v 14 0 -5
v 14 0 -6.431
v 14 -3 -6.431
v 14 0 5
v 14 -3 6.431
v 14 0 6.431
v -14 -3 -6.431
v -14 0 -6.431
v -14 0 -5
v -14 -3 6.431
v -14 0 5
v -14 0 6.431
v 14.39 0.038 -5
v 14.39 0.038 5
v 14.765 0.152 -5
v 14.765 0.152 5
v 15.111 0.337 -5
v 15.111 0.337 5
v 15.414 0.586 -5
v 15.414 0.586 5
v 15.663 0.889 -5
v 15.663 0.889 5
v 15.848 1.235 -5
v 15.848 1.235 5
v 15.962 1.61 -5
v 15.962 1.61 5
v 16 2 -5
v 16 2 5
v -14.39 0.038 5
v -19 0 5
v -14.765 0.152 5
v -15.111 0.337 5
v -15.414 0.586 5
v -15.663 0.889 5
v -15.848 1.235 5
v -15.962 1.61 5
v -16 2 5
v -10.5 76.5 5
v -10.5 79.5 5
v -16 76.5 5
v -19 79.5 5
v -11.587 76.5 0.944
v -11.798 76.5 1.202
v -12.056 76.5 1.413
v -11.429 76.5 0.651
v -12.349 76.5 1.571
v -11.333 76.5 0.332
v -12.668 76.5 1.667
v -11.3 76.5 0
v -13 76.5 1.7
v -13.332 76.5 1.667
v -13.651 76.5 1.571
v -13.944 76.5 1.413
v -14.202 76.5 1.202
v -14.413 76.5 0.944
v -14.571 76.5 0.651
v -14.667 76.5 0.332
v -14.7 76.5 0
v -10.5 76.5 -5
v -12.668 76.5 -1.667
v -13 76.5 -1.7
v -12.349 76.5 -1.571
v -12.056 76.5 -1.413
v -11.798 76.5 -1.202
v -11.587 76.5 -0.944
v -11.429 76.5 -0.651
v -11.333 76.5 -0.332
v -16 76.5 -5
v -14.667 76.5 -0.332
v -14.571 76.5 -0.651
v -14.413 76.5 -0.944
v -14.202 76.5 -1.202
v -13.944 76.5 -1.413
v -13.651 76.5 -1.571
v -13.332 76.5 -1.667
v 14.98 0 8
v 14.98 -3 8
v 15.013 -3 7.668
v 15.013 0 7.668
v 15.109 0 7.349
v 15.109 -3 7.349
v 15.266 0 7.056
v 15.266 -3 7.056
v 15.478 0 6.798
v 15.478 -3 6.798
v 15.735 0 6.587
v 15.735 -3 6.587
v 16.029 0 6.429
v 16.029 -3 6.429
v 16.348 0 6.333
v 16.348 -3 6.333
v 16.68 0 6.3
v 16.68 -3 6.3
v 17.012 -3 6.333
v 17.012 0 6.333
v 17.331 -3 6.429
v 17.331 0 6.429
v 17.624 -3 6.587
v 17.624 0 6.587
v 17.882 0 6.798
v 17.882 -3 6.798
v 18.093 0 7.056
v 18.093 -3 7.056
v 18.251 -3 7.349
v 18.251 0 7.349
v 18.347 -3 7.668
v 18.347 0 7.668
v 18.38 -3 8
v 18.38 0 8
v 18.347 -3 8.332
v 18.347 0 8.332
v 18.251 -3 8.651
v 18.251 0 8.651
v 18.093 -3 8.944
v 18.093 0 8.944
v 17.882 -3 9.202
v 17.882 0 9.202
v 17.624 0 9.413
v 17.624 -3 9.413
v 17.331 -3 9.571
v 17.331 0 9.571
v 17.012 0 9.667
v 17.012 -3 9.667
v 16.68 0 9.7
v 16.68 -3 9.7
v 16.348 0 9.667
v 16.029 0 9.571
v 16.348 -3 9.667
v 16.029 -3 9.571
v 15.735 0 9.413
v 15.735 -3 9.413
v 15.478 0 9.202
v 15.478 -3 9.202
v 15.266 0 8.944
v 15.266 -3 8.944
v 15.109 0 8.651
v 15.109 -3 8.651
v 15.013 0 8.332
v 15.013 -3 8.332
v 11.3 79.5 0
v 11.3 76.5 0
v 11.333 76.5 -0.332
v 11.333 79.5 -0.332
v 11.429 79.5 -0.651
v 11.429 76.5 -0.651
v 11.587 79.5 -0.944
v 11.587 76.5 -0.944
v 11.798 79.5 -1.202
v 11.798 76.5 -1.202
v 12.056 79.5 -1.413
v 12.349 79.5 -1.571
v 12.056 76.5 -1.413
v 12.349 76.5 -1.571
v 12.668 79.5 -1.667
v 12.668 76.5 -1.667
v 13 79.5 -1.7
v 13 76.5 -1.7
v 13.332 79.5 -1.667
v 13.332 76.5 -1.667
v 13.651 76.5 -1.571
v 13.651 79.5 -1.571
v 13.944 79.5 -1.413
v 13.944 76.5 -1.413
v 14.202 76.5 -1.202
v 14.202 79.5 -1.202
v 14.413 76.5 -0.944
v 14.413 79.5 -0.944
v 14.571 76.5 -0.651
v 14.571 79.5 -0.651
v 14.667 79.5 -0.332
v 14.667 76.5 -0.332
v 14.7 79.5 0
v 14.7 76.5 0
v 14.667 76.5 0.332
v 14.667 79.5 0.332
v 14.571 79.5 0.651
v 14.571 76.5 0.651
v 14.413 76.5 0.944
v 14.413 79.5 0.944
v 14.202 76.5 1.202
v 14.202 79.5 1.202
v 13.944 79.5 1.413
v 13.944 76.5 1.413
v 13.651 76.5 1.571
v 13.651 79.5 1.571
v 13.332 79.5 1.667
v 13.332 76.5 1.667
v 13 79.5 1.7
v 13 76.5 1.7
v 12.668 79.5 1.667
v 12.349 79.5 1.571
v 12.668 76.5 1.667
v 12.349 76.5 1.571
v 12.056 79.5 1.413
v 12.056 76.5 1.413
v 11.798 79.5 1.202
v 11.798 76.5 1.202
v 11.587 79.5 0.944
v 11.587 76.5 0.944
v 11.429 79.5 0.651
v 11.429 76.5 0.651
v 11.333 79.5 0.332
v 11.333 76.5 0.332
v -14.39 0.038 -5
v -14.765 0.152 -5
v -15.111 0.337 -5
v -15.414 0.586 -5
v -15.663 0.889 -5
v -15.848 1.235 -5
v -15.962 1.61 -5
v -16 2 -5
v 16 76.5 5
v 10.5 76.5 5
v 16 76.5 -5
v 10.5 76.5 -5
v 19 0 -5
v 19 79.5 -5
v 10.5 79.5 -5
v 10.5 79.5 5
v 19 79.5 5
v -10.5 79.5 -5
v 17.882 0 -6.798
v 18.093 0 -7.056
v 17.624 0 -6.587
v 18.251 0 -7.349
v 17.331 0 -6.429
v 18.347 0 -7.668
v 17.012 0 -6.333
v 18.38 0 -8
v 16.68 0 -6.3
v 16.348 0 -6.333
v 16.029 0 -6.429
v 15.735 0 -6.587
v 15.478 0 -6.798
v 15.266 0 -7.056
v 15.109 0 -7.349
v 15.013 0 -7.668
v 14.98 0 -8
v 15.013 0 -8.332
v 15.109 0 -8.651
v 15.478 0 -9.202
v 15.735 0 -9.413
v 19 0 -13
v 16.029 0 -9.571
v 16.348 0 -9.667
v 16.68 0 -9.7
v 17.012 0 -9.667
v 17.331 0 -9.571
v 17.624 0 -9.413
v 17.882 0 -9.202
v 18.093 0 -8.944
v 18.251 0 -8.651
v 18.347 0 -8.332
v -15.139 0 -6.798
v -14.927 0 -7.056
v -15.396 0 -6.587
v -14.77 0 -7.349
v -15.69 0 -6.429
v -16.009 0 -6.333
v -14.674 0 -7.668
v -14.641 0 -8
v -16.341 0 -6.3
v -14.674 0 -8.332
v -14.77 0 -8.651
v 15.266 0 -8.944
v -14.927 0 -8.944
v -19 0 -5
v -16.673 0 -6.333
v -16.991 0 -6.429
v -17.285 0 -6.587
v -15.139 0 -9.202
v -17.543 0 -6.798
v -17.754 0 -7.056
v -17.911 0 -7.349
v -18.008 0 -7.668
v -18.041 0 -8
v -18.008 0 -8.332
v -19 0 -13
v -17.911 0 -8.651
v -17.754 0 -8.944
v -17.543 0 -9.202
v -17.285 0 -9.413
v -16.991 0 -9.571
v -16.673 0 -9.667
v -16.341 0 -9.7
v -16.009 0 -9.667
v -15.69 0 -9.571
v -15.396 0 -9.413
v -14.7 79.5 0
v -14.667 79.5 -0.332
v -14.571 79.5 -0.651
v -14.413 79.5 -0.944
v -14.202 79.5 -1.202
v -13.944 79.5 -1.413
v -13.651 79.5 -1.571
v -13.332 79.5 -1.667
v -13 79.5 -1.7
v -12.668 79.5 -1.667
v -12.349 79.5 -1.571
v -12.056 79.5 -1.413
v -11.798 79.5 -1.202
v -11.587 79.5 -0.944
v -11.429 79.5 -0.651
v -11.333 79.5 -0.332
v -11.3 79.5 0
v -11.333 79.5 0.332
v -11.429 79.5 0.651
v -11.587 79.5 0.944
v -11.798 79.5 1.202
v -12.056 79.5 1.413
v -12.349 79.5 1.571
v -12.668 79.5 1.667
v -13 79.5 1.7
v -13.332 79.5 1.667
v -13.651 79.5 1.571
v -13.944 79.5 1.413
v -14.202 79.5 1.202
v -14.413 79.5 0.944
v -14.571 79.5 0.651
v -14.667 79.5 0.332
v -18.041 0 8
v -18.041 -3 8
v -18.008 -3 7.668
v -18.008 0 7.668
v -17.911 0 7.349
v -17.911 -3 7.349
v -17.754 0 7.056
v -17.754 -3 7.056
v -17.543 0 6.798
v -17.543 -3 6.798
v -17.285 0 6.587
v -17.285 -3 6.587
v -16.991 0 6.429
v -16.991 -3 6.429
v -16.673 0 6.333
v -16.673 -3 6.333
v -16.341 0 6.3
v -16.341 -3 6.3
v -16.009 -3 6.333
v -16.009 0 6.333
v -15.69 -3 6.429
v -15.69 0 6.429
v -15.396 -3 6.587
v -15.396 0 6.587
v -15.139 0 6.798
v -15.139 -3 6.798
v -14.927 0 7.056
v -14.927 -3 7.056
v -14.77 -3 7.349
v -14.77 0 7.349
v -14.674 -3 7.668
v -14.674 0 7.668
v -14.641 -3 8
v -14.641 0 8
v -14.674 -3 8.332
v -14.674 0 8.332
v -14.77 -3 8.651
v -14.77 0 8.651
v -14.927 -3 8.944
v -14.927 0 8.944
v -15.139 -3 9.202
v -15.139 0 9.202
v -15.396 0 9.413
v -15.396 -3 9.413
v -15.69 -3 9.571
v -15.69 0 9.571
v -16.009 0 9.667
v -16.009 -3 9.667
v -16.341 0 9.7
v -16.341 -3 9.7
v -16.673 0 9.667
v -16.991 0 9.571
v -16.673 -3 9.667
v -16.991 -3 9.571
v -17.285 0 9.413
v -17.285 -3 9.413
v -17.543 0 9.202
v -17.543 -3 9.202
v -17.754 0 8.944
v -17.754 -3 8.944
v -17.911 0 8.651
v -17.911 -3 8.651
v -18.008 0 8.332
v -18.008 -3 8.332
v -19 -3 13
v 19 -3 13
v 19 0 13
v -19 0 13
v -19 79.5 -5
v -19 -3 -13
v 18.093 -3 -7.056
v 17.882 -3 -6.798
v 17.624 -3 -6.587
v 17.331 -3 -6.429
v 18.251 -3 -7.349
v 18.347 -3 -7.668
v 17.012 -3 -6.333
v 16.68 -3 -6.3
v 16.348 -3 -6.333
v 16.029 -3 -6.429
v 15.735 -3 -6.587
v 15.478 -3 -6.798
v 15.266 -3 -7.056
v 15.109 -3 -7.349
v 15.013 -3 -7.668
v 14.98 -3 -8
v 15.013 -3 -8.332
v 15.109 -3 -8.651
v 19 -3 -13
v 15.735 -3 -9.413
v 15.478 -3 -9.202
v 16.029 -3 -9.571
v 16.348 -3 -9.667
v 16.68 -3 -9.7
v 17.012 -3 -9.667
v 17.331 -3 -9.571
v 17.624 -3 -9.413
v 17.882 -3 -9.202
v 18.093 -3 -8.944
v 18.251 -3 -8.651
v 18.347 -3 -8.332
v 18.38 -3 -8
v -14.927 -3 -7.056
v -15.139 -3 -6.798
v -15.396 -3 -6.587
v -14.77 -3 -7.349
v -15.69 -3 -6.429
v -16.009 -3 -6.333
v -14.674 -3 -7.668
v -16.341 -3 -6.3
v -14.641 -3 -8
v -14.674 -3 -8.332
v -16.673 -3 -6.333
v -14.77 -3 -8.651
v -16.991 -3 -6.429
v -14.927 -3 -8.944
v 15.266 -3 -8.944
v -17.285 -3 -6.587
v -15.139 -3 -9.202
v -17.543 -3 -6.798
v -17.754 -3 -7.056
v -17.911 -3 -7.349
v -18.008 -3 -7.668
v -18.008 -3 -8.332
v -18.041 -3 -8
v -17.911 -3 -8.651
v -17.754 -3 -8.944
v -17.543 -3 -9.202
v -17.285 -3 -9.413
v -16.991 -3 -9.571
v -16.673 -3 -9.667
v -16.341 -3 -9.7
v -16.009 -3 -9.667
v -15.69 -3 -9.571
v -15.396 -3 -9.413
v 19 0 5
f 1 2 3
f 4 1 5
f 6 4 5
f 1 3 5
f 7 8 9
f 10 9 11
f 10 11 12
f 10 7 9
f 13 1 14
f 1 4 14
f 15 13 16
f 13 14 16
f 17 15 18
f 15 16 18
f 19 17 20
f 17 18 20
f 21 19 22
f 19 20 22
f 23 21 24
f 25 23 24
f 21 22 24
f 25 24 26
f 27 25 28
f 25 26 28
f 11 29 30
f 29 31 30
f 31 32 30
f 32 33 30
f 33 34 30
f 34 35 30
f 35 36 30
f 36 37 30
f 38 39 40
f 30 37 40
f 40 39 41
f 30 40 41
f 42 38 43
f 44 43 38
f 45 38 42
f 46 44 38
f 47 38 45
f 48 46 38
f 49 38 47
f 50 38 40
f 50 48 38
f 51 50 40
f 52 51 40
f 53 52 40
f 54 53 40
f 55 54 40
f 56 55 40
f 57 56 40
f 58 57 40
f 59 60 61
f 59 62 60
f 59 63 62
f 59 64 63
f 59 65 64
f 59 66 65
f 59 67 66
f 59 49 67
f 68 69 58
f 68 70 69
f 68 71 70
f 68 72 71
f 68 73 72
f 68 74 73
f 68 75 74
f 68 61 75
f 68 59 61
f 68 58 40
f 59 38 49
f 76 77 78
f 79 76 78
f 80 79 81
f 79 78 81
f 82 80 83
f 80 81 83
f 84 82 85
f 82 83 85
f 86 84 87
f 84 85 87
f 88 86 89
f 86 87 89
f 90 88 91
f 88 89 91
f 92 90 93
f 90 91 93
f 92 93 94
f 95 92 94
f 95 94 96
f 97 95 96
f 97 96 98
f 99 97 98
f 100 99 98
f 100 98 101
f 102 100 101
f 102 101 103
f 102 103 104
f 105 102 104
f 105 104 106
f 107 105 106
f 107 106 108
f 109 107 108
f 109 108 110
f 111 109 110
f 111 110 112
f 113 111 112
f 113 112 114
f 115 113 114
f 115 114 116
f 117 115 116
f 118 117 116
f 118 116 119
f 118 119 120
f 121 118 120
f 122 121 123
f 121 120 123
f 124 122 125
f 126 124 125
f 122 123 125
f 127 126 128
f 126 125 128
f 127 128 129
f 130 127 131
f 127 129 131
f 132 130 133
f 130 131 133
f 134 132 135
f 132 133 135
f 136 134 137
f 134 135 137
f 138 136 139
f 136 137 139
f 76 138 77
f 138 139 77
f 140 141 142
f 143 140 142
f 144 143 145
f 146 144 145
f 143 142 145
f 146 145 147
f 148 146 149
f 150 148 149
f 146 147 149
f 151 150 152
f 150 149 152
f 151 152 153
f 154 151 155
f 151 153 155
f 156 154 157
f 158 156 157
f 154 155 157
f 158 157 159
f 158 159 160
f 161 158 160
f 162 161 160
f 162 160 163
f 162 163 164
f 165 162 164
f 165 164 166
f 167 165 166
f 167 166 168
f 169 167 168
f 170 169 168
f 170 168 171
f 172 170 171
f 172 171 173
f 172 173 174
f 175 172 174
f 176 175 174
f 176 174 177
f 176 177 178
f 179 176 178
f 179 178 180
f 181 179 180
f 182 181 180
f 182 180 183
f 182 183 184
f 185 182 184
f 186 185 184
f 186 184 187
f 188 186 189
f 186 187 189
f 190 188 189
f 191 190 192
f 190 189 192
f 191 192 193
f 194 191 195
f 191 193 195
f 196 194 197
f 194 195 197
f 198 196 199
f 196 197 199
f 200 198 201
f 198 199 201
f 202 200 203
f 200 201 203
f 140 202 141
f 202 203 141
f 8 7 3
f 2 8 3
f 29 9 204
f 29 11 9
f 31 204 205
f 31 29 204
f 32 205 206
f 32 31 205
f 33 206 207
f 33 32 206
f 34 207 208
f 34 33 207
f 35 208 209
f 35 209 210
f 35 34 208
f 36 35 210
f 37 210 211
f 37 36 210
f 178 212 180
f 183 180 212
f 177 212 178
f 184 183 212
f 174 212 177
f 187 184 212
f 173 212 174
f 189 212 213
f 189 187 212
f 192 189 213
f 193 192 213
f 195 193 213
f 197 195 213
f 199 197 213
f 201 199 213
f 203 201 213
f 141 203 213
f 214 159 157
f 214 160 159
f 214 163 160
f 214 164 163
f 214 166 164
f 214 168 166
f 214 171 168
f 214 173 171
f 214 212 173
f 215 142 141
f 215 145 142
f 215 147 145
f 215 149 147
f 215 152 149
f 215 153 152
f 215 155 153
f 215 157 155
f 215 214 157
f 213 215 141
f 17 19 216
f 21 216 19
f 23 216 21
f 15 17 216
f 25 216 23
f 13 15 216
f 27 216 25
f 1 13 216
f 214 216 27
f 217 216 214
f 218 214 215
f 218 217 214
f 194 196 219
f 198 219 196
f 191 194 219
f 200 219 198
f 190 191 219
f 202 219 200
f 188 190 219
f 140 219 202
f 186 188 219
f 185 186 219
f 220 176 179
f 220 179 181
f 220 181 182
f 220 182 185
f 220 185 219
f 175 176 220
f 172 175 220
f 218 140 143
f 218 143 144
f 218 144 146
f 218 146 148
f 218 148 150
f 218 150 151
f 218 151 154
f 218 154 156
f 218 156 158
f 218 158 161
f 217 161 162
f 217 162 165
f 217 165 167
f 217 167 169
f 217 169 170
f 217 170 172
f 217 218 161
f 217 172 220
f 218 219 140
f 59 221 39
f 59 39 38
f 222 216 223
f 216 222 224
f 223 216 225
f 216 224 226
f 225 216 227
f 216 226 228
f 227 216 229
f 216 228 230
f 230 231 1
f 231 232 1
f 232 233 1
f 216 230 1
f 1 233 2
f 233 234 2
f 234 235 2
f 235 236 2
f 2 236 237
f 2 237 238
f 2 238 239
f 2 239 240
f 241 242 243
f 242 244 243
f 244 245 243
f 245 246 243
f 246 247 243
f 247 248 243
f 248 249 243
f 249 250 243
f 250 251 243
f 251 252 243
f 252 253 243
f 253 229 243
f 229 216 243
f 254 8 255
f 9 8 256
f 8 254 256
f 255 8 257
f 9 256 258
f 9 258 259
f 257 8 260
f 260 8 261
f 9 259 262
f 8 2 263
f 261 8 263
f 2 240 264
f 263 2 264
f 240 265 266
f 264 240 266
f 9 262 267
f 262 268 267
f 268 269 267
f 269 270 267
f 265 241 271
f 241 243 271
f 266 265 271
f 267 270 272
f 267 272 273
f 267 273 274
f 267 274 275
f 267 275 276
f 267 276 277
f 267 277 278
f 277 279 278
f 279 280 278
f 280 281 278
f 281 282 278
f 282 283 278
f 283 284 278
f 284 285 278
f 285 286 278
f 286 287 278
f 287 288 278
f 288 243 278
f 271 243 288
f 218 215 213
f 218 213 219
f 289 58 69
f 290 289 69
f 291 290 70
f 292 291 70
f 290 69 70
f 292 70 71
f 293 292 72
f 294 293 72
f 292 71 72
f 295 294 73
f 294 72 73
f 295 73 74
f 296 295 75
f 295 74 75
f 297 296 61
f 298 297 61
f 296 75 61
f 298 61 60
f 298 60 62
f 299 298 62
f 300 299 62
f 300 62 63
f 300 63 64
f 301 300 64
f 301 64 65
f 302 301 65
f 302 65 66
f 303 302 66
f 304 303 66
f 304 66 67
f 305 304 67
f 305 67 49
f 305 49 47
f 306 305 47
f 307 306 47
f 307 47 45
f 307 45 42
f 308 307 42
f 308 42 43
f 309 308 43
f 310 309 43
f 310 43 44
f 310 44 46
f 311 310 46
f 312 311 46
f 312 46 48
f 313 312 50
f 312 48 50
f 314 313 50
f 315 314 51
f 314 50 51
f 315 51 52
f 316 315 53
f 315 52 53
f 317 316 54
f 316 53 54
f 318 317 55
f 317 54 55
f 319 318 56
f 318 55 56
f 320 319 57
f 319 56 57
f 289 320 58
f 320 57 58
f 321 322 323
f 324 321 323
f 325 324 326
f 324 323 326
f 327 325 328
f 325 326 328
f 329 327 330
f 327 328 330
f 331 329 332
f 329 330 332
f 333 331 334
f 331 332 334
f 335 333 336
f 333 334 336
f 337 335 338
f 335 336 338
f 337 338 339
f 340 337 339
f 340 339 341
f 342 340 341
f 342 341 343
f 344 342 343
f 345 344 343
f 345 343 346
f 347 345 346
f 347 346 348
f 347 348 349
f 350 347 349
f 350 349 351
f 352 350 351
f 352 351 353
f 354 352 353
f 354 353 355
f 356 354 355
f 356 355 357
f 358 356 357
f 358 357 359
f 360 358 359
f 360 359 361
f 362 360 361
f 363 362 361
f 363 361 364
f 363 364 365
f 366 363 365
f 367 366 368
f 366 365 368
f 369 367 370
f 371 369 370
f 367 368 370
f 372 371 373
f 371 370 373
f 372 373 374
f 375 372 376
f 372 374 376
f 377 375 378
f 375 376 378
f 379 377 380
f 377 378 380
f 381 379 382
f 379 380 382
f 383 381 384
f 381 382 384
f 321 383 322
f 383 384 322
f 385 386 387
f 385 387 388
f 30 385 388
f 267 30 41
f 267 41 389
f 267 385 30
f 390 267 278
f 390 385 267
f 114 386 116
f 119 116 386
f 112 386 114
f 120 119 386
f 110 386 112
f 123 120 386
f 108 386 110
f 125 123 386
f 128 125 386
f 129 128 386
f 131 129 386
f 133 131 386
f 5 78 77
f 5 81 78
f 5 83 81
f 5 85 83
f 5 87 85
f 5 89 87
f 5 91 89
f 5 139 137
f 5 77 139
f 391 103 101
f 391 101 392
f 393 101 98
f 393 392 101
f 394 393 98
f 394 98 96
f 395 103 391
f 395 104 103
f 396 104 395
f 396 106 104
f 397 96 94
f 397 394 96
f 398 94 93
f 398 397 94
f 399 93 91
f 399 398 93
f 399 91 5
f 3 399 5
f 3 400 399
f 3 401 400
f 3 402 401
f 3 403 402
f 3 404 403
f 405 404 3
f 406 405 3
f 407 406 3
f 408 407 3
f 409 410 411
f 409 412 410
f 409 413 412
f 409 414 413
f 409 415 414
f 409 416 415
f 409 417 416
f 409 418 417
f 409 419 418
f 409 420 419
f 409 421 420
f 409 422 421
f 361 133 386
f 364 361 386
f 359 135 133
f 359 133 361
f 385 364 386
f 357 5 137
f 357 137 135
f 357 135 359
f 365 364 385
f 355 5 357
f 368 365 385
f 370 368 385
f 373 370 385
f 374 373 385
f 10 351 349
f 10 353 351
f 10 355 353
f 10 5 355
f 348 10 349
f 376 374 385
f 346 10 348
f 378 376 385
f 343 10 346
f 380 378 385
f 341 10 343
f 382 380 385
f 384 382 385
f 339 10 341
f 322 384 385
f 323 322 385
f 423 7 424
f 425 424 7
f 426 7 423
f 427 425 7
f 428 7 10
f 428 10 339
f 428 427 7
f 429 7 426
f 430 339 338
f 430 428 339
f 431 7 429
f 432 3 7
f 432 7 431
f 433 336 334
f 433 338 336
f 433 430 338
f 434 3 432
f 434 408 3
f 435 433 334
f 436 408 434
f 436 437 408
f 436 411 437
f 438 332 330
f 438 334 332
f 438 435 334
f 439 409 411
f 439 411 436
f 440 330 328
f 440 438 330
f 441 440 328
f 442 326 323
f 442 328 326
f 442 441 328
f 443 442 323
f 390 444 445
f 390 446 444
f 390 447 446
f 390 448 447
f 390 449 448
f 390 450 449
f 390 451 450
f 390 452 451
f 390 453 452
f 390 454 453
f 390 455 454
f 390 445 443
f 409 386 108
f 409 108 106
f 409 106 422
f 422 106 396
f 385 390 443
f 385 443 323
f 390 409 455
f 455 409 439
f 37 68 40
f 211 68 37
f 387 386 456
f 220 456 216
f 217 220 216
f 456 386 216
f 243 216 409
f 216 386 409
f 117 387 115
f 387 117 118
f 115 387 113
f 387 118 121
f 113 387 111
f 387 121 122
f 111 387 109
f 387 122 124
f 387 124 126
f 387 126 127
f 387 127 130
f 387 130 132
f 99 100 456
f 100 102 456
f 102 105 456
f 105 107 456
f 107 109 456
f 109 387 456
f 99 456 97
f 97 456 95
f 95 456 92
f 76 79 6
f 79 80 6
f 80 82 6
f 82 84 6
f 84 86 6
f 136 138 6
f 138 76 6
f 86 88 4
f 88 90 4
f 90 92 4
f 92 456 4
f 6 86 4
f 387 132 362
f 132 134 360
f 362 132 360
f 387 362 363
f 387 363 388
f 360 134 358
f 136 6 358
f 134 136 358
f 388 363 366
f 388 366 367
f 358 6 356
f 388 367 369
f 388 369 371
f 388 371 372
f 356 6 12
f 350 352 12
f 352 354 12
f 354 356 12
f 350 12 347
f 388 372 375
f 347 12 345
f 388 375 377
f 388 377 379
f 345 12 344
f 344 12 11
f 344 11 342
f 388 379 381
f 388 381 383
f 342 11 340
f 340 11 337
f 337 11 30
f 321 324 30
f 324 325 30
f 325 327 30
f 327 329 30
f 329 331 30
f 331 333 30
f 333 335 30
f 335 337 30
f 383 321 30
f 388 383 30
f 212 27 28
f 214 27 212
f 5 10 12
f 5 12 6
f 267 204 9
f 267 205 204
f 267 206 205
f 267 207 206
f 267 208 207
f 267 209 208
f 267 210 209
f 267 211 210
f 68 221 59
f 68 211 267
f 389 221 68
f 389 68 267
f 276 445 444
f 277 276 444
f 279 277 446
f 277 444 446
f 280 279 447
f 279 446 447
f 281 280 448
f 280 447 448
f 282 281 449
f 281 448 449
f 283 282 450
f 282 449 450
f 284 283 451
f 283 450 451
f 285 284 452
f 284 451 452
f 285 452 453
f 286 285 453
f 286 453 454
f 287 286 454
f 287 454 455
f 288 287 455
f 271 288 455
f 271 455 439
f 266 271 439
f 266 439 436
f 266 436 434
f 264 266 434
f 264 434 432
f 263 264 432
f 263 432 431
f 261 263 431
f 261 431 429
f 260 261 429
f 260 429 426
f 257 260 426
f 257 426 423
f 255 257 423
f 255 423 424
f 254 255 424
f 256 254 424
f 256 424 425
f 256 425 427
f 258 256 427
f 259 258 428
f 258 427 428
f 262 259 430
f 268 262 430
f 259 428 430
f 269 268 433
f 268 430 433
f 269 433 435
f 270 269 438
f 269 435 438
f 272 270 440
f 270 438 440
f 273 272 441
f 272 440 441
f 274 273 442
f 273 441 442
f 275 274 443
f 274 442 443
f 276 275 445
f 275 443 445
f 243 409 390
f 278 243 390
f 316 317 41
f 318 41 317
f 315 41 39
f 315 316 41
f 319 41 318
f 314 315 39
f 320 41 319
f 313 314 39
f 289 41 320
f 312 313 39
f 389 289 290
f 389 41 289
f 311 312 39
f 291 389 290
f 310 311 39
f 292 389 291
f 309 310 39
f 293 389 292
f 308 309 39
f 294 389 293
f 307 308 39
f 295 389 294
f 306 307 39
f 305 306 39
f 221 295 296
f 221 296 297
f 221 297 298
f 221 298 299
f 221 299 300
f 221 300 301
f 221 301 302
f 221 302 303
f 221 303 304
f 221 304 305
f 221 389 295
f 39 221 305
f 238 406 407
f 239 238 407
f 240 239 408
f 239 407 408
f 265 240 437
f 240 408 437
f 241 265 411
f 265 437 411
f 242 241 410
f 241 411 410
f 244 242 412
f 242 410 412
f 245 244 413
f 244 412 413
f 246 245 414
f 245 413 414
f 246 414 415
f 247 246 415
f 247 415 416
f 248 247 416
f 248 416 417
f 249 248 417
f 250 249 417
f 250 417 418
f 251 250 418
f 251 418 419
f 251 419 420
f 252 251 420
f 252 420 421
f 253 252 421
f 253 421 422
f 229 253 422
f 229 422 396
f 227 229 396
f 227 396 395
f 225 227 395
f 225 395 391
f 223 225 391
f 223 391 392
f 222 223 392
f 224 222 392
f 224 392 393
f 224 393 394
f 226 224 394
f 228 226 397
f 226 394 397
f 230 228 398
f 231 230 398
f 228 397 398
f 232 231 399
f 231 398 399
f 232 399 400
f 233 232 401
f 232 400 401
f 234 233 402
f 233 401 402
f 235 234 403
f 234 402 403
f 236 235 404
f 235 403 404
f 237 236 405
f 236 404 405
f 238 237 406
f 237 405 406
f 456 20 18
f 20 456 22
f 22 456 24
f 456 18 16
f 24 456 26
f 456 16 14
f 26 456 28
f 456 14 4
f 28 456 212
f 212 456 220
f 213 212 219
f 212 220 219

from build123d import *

# Parameters (mm, degrees)
BOSS_EXTRUDE1_DEPTH      = 5
BOSS_EXTRUDE1_DEPTH_BACK = 5
SKETCH3_W                = 38
SKETCH3_H                = 26
BOSS_EXTRUDE2_DEPTH      = 3
M3_CLEARANCE_HOLE1_D     = 3.4
M3_CLEARANCE_HOLE1_DEPTH = 3
FILLET3_R                = 2
M3_CLEARANCE_HOLE2_D     = 3.4
M3_CLEARANCE_HOLE2_DEPTH = 10
M3_CLEARANCE_HOLE2_TIP   = 1.021463052
SKETCH4_W                = 28
SKETCH4_H                = 12.861112754
CUT_EXTRUDE2_DEPTH       = 3


with BuildPart() as part:
    # Sketch1 → Boss-Extrude1 (new, two sides: drawn at the far end of the back side and taken through both)
    with BuildSketch(Plane.XY.offset(-BOSS_EXTRUDE1_DEPTH_BACK)):
        Polygon((19, -3), (-19, -3), (-19, 44.583333333), (-19, 79.5), (-10.5, 79.5), (-10.5, 76.5), (-16, 76.5), (-16, 0), (16, 0), (16, 76.5), (10.5, 76.5), (10.5, 79.5), (19, 79.5), align=None)
    extrude(amount=BOSS_EXTRUDE1_DEPTH + BOSS_EXTRUDE1_DEPTH_BACK)

    # Sketch3 → Boss-Extrude2 (add)
    with BuildSketch(Plane(origin=(0, -3, 0), x_dir=(-1, 0, 0), z_dir=(0, -1, 0))):
        Rectangle(SKETCH3_W, SKETCH3_H)
    extrude(amount=-BOSS_EXTRUDE2_DEPTH)

    # M3 Clearance Hole1
    with Locations(Plane(origin=(0, 79.5, 0), x_dir=(1, 0, 0), z_dir=(0, 1, 0))):
        with Locations((-13, 0), (13, 0)):
            Hole(M3_CLEARANCE_HOLE1_D / 2, depth=M3_CLEARANCE_HOLE1_DEPTH)

    # Fillet3
    fillet3_edges = [part.edges().sort_by_distance(p)[0] for p in [
        (-16, 0, 0),
        (16, 0, 0),
    ]]
    fillet(fillet3_edges, radius=FILLET3_R)

    # M3 Clearance Hole2
    with Locations(Plane(origin=(0, 0, 0), x_dir=(1, 0, 0), z_dir=(0, 1, 0))):
        with Locations((16.679968376, -8), (-16.340858472, -8), (16.679968376, 8), (-16.340858472, 8)):
            Hole(M3_CLEARANCE_HOLE2_D / 2, depth=M3_CLEARANCE_HOLE2_DEPTH)
            with Locations((0, 0, -(M3_CLEARANCE_HOLE2_DEPTH + M3_CLEARANCE_HOLE2_TIP / 2))):  # 118° drill point
                Cone(0, M3_CLEARANCE_HOLE2_D / 2, M3_CLEARANCE_HOLE2_TIP, mode=Mode.SUBTRACT)

    # Sketch4 → Cut-Extrude2 (cut)
    with BuildSketch(Plane.XZ.offset(3)):
        Rectangle(SKETCH4_W, SKETCH4_H)
    extrude(amount=-CUT_EXTRUDE2_DEPTH, mode=Mode.SUBTRACT)


solid = part.part
